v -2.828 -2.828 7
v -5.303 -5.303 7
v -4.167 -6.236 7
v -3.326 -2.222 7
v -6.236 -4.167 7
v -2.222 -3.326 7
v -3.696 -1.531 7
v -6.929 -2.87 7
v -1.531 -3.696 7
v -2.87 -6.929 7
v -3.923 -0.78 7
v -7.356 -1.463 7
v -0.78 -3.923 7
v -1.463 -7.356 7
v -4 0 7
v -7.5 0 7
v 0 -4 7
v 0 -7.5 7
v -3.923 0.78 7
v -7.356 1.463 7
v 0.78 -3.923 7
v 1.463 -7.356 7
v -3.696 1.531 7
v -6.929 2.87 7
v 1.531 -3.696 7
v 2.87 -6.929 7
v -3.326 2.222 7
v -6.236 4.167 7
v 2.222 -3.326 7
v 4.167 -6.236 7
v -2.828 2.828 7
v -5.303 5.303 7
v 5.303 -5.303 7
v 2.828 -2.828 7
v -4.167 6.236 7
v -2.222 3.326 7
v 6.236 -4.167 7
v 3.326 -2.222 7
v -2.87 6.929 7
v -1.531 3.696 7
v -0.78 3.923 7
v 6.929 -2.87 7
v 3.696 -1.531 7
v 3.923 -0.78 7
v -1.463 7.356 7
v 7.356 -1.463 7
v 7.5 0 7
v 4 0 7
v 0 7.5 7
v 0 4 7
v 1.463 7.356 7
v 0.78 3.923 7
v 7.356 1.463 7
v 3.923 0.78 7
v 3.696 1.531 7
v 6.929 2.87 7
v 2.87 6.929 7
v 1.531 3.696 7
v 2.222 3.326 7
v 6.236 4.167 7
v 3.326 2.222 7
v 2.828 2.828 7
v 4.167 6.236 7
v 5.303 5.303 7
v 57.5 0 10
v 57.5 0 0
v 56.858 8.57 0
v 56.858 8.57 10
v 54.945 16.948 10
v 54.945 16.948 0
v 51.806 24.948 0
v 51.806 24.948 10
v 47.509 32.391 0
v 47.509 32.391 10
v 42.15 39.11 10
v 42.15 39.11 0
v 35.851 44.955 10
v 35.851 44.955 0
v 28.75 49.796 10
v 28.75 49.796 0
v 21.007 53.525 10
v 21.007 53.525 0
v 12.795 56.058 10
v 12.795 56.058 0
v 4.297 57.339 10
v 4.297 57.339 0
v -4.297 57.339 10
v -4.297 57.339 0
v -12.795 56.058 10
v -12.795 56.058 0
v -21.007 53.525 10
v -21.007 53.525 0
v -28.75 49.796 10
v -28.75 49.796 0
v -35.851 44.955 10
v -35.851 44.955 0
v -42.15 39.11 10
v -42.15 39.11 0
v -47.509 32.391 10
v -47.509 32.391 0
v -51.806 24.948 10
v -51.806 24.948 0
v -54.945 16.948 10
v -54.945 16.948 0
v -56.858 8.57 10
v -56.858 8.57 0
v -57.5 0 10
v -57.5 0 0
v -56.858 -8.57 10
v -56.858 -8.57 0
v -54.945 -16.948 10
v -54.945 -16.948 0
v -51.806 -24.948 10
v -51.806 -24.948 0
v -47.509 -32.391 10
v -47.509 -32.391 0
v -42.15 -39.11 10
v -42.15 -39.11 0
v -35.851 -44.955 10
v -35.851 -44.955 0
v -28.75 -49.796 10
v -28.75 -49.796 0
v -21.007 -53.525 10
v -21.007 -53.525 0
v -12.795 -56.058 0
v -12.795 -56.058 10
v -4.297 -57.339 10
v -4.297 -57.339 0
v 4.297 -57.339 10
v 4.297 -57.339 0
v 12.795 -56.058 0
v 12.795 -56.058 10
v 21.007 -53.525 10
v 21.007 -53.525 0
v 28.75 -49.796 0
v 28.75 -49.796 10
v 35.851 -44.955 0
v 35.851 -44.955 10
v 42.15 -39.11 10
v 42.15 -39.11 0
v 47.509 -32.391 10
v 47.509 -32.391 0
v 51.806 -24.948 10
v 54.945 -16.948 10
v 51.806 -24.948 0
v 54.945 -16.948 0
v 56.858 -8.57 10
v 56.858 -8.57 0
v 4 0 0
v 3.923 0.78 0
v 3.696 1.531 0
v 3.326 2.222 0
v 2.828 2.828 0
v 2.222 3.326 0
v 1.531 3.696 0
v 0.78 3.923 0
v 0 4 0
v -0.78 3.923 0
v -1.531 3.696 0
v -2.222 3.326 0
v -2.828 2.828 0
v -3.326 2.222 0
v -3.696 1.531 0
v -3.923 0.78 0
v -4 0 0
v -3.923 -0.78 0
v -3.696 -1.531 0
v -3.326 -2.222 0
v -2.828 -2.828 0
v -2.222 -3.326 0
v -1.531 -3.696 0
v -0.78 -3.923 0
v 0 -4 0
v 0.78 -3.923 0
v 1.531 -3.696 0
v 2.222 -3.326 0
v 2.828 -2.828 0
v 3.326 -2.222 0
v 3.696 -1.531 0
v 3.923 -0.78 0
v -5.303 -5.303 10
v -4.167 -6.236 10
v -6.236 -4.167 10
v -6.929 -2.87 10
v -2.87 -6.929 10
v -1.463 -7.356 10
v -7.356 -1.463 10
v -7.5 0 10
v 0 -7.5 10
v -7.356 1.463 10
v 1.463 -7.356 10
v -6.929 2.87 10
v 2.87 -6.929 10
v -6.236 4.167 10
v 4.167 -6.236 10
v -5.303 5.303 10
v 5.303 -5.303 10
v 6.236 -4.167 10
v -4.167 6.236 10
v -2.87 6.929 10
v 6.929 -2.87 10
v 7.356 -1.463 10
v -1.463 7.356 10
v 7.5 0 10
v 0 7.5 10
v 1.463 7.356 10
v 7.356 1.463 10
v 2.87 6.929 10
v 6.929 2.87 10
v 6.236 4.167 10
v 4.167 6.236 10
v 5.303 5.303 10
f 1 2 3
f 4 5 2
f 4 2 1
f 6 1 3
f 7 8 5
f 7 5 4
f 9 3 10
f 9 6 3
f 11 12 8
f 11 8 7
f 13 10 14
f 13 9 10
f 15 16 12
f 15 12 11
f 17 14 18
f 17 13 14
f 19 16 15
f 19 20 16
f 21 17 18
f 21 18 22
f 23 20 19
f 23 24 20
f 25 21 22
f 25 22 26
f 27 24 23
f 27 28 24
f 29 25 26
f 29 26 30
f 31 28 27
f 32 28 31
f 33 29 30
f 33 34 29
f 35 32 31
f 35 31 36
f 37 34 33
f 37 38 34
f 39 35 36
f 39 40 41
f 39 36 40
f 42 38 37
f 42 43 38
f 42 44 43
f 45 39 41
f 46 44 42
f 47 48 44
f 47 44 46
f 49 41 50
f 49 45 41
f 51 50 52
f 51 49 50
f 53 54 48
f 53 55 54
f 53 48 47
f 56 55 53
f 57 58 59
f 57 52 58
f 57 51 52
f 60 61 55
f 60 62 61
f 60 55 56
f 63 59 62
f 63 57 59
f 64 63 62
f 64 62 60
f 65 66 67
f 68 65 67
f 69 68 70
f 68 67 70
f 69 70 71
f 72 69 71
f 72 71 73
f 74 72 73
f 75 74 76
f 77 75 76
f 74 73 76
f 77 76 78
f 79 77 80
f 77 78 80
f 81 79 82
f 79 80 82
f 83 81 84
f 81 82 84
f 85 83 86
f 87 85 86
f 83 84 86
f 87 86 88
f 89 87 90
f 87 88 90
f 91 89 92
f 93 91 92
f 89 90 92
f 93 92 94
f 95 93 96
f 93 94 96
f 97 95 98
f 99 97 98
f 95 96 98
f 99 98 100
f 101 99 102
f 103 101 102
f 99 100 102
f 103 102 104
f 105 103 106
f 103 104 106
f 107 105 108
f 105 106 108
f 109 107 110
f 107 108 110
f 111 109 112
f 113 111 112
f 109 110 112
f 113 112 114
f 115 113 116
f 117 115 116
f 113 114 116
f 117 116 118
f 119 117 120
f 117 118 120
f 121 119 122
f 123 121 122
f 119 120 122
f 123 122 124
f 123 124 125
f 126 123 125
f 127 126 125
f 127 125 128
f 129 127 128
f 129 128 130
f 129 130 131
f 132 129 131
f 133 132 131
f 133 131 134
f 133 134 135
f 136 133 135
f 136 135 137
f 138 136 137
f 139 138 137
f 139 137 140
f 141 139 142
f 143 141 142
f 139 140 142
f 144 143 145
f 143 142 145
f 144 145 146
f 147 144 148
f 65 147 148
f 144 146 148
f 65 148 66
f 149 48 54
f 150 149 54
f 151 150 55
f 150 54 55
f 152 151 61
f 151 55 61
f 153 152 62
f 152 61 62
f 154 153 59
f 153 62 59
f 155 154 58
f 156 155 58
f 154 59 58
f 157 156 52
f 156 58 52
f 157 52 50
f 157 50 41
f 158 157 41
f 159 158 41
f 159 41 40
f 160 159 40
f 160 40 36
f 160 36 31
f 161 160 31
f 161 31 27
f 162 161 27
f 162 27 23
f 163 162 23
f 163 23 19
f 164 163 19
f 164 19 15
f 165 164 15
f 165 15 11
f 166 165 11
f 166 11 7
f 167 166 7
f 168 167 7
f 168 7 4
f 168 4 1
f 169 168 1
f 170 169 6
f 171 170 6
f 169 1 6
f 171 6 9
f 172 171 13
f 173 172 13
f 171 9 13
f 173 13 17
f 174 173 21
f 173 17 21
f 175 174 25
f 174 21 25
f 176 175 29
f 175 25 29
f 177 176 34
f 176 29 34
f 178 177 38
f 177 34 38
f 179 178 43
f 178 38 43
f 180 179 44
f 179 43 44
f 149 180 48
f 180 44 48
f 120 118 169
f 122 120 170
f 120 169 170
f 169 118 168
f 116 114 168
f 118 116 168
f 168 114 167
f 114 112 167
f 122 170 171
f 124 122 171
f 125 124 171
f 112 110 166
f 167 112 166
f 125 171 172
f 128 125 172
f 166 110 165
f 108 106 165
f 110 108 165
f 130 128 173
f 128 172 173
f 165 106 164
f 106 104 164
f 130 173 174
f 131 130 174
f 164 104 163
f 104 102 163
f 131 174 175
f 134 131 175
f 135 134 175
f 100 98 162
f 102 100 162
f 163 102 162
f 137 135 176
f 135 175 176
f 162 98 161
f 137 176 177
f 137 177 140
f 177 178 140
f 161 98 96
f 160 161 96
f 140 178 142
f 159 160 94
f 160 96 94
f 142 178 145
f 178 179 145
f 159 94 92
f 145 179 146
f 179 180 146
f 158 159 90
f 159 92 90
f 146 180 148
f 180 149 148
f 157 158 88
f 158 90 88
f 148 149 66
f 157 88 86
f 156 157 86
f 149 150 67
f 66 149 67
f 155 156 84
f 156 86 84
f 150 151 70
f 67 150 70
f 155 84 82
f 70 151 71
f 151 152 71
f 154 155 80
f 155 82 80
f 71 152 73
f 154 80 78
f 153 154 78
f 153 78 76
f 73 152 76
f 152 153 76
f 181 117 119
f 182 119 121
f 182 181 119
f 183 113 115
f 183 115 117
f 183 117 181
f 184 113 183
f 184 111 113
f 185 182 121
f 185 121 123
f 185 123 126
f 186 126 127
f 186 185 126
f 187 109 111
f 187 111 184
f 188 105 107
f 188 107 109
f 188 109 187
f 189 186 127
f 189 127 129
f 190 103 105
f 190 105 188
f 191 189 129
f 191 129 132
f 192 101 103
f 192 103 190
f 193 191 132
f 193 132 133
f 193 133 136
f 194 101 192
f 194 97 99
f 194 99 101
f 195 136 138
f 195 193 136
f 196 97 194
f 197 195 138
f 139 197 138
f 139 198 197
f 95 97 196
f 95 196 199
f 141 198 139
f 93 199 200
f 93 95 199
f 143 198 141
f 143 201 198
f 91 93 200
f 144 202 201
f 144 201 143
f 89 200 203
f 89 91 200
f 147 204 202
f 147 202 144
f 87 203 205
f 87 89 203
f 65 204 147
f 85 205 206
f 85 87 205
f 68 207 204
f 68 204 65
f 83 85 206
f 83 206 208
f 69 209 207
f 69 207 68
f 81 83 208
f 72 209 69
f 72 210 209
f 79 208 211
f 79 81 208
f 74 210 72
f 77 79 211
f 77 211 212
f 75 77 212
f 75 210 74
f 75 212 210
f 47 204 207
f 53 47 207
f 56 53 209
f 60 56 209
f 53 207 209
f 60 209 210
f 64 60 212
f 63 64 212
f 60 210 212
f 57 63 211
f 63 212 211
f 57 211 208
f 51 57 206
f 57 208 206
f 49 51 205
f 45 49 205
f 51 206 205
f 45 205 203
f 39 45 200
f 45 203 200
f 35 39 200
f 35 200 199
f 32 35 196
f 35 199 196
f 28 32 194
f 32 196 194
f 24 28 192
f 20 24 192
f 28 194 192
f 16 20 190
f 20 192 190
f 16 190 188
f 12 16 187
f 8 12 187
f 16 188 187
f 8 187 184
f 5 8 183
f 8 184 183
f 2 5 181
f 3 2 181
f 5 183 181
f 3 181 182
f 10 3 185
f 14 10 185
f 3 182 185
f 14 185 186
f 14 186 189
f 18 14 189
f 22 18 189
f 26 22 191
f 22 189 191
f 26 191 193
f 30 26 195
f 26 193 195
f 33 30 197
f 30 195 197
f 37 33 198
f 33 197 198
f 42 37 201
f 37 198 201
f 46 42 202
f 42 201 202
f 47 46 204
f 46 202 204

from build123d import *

# Parameters (mm, degrees)
SKETCH1_R           = 57.5
BOSS_EXTRUDE1_DEPTH = 10
SKETCH2_R           = 7.5
SKETCH2_R_2         = 4
CUT_EXTRUDE1_DEPTH  = 3
SKETCH2_2_R         = 4
CUT_EXTRUDE2_DEPTH  = 82.929848041


with BuildPart() as part:
    # Sketch1 → Boss-Extrude1 (new body)
    with BuildSketch(Plane.XY):
        Circle(SKETCH1_R)
    extrude(amount=BOSS_EXTRUDE1_DEPTH)

    # Sketch2 → Cut-Extrude1 (cut)
    with BuildSketch(Plane.XY.offset(10)):
        Circle(SKETCH2_R)
        Circle(SKETCH2_R_2, mode=Mode.SUBTRACT)
    extrude(amount=-CUT_EXTRUDE1_DEPTH, mode=Mode.SUBTRACT)

    # Sketch2<2> → Cut-Extrude2 (cut, through all)
    with BuildSketch(Plane.XY.offset(10)):
        Circle(SKETCH2_2_R)
    extrude(amount=-CUT_EXTRUDE2_DEPTH, mode=Mode.SUBTRACT)


solid = part.part
